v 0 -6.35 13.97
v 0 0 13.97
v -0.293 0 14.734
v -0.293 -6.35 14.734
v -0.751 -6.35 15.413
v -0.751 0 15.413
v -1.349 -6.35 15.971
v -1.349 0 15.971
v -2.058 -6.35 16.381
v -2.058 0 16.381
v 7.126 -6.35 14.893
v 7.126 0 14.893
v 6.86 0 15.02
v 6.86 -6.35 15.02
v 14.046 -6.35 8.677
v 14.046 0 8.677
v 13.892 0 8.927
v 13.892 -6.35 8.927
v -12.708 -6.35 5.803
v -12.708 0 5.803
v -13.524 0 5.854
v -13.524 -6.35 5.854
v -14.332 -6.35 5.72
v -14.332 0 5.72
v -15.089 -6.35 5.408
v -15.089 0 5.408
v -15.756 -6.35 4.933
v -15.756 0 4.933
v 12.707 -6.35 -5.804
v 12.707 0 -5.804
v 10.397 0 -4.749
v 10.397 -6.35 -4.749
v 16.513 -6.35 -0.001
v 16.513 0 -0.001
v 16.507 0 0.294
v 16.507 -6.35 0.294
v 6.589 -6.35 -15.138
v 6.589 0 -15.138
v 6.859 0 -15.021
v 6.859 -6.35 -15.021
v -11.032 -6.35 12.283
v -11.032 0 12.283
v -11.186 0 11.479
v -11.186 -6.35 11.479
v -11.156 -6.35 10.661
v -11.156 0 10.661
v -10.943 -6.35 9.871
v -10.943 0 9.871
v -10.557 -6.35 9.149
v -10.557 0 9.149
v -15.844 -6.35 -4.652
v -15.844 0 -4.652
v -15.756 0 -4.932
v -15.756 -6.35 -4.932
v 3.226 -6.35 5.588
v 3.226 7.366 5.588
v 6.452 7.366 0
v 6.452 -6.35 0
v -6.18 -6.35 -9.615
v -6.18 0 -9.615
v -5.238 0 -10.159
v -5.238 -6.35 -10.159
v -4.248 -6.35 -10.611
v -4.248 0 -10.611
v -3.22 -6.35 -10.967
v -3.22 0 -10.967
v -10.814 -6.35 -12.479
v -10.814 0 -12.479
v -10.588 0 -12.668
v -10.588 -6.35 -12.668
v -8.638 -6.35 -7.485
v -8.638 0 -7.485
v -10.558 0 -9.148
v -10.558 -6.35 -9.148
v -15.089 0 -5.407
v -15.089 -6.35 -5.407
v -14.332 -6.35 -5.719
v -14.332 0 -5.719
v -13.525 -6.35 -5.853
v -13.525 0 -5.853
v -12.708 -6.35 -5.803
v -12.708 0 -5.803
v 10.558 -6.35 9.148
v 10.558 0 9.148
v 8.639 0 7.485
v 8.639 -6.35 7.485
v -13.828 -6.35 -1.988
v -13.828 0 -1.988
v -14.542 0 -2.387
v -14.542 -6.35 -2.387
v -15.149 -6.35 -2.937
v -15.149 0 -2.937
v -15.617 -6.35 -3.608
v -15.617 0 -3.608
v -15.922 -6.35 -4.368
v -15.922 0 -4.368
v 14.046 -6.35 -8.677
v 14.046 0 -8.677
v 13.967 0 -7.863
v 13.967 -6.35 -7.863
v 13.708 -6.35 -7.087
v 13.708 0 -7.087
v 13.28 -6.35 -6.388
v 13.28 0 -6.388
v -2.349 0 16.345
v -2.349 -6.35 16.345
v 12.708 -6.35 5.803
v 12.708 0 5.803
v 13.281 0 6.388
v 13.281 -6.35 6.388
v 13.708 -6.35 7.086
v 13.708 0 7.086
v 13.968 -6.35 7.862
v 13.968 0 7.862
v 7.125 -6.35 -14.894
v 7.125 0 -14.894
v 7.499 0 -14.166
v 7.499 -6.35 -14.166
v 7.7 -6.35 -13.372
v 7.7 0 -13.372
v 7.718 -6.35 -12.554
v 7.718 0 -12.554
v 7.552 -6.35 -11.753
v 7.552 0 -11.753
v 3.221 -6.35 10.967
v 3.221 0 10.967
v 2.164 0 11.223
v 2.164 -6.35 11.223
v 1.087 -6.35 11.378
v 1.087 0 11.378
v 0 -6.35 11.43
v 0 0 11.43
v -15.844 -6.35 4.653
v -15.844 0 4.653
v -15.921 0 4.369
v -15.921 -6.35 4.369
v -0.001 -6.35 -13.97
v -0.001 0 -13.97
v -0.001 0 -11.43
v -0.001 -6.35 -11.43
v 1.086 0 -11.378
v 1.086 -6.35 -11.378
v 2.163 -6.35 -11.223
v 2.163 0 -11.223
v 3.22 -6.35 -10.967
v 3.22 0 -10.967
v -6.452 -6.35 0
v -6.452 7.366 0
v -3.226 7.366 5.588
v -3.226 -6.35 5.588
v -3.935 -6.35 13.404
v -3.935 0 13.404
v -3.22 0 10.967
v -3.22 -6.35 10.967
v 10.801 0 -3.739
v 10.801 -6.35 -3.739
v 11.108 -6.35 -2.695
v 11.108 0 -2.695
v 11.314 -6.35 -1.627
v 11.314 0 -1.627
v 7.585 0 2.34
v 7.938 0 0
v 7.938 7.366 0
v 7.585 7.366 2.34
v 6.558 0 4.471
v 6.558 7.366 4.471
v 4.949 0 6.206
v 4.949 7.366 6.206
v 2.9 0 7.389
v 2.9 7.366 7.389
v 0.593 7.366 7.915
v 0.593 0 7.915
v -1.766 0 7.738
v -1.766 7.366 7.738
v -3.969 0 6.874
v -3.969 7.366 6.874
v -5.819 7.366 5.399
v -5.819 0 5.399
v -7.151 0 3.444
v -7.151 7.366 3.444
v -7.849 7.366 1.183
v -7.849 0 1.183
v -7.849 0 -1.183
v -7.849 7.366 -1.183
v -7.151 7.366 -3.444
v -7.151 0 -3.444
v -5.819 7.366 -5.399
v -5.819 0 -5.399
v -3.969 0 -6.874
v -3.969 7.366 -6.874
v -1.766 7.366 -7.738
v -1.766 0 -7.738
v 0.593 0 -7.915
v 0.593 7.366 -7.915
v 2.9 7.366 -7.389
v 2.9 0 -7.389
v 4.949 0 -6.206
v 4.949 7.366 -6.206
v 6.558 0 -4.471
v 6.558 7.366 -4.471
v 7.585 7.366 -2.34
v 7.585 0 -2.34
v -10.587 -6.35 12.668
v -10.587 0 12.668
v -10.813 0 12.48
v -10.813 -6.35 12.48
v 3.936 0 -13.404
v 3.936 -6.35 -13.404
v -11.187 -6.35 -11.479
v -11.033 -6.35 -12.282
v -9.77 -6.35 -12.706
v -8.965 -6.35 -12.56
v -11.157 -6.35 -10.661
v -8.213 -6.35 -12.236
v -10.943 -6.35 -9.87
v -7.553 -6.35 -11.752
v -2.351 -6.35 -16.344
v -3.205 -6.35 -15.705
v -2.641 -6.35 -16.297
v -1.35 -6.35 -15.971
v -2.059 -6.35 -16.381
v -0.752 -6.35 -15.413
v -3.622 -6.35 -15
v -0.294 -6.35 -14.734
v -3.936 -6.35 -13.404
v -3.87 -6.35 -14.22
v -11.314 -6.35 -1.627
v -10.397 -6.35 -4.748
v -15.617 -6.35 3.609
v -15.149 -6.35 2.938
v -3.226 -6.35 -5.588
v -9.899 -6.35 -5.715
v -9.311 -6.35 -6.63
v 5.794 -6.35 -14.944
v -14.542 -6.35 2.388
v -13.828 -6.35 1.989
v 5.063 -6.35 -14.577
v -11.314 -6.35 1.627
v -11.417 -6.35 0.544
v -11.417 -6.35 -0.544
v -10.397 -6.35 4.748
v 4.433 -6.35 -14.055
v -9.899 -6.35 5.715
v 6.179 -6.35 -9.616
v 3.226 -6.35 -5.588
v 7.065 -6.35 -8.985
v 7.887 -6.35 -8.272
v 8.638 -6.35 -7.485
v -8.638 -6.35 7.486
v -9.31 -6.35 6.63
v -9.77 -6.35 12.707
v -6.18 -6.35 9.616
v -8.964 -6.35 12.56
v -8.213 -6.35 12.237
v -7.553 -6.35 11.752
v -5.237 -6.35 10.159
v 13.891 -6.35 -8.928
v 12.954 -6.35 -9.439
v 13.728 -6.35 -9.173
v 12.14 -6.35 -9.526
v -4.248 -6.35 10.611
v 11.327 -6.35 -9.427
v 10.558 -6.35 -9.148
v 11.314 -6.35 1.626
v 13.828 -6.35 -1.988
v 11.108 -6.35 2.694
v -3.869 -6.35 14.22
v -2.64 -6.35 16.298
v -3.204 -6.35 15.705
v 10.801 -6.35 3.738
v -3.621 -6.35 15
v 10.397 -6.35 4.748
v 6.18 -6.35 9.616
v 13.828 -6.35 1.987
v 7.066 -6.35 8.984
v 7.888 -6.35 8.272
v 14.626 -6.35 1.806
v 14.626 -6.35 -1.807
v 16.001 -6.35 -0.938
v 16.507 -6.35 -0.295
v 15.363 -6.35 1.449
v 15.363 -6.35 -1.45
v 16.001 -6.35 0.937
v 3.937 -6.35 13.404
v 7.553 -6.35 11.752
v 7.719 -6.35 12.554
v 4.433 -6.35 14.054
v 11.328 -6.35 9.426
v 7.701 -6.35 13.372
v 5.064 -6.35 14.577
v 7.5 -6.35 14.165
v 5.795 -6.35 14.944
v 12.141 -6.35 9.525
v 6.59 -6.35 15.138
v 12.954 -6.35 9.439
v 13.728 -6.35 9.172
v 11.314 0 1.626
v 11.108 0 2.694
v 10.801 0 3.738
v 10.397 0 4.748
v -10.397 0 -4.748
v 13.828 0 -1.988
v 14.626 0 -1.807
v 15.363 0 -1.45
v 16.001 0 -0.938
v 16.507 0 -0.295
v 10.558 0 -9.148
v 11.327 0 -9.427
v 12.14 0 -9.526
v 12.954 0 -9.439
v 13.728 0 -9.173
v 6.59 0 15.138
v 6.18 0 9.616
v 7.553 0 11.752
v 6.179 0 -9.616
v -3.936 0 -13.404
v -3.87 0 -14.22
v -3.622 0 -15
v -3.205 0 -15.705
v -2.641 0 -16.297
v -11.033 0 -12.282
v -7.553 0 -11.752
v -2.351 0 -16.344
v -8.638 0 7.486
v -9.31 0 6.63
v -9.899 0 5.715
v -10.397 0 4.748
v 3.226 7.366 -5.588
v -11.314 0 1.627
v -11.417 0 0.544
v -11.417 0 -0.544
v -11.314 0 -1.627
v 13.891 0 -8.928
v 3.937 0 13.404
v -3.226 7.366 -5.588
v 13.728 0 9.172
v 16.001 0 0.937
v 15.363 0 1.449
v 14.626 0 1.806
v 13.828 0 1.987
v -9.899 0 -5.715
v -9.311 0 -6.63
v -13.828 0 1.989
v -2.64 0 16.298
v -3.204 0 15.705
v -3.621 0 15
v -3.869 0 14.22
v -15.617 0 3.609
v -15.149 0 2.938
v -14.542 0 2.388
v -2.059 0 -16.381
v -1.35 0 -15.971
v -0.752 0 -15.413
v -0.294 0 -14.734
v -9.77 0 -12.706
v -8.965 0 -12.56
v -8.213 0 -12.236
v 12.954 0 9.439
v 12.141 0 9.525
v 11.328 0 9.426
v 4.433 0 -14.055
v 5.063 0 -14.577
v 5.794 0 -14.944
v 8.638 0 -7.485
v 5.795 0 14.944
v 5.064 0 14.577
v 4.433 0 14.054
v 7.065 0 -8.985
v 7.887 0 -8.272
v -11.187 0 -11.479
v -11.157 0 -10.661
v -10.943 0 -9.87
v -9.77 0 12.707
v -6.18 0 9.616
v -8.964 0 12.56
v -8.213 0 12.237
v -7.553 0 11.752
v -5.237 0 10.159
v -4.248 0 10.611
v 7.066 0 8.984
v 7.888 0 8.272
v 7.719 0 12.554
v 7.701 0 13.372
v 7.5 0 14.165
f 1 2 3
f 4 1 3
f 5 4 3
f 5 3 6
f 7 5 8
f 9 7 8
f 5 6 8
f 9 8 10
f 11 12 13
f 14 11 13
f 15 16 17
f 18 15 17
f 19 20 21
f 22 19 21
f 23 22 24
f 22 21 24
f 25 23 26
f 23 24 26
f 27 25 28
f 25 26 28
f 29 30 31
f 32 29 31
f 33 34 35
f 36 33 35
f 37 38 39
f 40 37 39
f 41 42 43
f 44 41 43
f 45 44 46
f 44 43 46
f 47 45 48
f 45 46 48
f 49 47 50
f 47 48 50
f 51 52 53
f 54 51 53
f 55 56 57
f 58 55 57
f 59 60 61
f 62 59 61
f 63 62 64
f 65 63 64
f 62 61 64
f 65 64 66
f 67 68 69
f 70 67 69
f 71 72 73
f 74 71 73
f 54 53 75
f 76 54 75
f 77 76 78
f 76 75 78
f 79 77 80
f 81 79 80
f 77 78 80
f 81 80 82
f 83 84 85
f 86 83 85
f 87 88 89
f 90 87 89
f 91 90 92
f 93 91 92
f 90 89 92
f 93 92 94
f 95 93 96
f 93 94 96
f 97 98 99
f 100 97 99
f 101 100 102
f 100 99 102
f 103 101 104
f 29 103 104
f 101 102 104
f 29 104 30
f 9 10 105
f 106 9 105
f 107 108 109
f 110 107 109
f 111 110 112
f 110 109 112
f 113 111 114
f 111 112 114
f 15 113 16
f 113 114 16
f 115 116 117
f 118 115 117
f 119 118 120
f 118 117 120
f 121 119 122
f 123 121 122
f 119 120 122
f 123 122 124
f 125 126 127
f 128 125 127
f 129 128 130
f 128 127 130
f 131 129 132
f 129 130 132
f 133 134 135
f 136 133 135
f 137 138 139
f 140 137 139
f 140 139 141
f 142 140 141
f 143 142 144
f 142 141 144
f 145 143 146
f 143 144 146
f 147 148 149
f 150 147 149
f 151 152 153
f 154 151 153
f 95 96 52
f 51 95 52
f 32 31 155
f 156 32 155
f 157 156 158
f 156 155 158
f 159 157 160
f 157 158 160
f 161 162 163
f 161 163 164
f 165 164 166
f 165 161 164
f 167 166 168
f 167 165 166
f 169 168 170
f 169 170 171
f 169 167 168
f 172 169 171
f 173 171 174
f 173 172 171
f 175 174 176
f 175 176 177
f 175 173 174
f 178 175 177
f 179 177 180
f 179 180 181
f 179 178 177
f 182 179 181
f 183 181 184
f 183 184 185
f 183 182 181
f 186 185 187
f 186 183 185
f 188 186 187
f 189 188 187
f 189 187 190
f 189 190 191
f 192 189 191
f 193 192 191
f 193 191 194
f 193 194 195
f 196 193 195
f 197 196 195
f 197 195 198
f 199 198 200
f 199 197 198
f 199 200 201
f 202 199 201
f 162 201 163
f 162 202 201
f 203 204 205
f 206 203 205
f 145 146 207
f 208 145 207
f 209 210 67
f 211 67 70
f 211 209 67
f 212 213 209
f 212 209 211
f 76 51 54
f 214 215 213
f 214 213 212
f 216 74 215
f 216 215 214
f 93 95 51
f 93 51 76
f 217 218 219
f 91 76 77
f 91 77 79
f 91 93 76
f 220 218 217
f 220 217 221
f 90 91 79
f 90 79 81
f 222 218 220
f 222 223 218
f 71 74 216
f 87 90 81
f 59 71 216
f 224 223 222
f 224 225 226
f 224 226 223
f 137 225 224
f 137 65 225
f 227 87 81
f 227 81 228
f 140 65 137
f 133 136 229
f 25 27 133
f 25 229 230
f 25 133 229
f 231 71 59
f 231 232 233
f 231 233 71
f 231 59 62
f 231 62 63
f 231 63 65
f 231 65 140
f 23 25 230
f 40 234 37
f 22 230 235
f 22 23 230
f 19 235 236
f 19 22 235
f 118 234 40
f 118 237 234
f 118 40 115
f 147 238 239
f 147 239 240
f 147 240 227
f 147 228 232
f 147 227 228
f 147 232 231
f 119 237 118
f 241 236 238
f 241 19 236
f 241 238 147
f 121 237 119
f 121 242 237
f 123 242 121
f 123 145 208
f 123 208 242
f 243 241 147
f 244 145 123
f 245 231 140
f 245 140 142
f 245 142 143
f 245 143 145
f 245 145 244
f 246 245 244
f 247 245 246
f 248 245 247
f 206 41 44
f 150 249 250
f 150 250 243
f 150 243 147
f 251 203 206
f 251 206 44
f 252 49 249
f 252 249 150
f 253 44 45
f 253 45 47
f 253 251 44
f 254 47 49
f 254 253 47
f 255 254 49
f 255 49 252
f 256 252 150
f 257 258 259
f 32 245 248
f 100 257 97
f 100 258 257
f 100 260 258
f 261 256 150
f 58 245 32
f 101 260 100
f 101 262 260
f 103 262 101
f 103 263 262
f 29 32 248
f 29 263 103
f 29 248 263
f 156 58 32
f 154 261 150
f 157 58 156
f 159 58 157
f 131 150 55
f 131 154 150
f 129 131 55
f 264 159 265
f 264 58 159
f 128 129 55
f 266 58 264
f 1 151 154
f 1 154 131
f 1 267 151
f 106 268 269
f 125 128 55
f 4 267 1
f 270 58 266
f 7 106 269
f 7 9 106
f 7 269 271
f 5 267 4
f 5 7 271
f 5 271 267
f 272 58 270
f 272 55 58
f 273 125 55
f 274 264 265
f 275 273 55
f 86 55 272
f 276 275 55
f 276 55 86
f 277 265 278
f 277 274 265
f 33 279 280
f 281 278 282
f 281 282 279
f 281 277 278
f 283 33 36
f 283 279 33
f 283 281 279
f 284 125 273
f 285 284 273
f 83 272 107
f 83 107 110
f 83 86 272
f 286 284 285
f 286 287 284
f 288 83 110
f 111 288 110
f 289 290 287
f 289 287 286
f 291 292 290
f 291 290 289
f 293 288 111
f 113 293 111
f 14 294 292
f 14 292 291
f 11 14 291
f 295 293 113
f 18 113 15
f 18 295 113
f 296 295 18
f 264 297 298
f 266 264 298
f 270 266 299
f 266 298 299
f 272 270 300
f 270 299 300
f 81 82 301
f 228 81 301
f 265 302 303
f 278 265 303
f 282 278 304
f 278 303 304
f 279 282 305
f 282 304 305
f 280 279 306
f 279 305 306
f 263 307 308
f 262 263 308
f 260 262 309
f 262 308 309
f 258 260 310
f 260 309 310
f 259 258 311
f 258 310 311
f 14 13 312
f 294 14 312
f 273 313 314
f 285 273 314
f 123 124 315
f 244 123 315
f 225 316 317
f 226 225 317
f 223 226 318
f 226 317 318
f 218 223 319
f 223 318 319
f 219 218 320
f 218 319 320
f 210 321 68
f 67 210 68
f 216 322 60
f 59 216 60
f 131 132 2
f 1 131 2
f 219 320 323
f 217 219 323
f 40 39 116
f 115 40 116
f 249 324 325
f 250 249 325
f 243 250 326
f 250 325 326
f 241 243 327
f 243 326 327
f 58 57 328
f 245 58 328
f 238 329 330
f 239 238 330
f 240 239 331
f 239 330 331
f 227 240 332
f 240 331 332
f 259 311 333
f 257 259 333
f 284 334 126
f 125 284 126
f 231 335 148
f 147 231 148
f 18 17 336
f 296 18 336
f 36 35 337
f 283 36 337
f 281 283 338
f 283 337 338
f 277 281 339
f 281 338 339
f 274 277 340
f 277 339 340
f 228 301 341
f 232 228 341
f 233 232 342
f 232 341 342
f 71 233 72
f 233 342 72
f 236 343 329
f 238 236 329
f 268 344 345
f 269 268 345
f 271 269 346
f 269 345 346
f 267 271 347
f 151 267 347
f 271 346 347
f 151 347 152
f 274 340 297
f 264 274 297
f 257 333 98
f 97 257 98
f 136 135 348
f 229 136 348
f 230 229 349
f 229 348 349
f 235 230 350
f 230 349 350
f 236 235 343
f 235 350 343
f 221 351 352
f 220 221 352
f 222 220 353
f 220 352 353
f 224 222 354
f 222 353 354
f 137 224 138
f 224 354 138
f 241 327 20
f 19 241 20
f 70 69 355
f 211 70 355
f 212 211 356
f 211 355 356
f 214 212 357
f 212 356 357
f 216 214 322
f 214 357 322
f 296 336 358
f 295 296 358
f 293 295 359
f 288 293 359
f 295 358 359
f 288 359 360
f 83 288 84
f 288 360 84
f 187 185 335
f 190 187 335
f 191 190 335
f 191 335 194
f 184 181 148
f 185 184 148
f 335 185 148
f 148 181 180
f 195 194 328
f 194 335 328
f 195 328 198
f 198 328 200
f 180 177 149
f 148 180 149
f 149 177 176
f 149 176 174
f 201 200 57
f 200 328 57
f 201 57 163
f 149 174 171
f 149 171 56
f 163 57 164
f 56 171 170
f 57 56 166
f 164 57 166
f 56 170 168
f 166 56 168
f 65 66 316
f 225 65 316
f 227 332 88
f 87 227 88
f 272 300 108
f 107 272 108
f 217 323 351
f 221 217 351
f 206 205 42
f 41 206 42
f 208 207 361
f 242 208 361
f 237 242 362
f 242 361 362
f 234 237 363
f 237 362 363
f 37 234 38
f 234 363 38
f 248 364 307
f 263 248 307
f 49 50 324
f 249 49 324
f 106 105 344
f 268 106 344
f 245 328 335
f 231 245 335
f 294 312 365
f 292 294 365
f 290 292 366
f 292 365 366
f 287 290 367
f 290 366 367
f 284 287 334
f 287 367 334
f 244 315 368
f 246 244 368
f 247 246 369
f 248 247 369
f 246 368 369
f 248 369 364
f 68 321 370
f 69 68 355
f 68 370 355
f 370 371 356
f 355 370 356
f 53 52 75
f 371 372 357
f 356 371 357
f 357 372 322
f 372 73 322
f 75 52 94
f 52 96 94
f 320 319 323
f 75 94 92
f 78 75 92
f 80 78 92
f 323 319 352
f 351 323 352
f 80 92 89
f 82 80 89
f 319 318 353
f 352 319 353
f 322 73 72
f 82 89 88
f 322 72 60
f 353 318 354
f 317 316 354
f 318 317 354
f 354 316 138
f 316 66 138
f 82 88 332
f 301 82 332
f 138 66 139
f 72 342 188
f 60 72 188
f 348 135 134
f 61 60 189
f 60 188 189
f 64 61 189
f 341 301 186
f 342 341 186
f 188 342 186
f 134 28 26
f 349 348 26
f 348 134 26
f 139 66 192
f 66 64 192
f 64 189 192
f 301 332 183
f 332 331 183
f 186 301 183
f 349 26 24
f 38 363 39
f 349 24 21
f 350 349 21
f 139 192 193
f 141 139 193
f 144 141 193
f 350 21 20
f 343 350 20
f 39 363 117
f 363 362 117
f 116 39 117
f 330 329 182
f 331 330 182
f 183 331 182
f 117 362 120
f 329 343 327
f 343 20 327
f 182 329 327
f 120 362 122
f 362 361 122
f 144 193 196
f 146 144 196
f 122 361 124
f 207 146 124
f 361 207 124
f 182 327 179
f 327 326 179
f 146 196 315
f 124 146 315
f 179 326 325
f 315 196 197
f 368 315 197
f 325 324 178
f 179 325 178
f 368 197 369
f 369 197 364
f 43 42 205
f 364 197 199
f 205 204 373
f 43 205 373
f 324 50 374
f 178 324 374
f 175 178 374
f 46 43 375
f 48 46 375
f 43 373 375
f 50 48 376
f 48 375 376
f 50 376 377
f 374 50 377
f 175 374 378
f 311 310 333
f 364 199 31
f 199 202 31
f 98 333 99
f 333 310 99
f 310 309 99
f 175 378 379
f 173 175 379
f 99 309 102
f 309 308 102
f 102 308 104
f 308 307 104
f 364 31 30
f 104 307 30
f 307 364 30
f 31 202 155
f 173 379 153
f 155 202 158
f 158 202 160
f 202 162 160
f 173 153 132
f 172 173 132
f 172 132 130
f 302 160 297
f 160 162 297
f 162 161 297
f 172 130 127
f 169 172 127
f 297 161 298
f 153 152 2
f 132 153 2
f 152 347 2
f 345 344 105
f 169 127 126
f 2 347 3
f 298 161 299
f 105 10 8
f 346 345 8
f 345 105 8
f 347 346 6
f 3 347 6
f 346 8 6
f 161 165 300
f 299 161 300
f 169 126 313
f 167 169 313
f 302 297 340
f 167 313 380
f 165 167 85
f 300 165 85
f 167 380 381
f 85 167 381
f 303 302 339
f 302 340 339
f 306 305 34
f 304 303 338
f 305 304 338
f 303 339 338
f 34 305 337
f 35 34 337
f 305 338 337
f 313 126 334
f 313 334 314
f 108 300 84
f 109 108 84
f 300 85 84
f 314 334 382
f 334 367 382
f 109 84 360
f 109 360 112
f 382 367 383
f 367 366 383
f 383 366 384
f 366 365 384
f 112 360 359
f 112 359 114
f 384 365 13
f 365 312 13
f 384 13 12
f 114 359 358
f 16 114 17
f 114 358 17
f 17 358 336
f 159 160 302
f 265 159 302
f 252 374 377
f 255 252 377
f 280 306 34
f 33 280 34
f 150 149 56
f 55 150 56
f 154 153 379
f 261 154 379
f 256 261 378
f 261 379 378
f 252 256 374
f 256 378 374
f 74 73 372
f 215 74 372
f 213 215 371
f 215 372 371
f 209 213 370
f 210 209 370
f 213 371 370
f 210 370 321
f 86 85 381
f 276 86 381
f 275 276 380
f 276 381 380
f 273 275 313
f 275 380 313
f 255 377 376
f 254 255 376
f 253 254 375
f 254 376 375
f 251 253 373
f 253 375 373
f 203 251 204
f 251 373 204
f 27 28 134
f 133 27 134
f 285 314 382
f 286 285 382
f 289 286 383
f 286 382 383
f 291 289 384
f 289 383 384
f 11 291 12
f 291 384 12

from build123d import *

# Parameters (mm, degrees)
F1_DEPTH = 6.35
F2_R     = 7.9375
F3_DEPTH = 7.366
F5_DEPTH = 25.4
F6_DEPTH = 25.4


with BuildPart() as f1:
    # F0 (on Front) → F1 (new body)
    with BuildSketch(Plane.XZ):
        with BuildLine():
            Line((-3.934953, 13.404367), (-3.219507, 10.967209))
            ThreePointArc((-3.219507, 10.967209), (-4.747864, 10.397244), (-6.179525, 9.615528))
            Line((-6.179525, 9.615528), (-7.552752, 11.752312))
            ThreePointArc((-7.552752, 11.752312), (-8.964411, 12.560176), (-10.587279, 12.66845))
            Line((-10.587279, 12.66845), (-10.813072, 12.47975))
            Line((-10.813072, 12.47975), (-11.031997, 12.283124))
            ThreePointArc((-11.031997, 12.283124), (-11.155886, 10.661374), (-10.557241, 9.149075))
            Line((-10.557241, 9.149075), (-8.637743, 7.485606))
            ThreePointArc((-8.637743, 7.485606), (-9.615332, 6.17983), (-10.397094, 4.748194))
            Line((-10.397094, 4.748194), (-12.707559, 5.803348))
            ThreePointArc((-12.707559, 5.803348), (-14.331886, 5.719766), (-15.755667, 4.933463))
            Line((-15.755667, 4.933463), (-15.843597, 4.652646))
            Line((-15.843597, 4.652646), (-15.921465, 4.368874))
            ThreePointArc((-15.921465, 4.368874), (-15.148902, 2.937591), (-13.827679, 1.989016))
            Line((-13.827679, 1.989016), (-11.313556, 1.627377))
            ThreePointArc((-11.313556, 1.627377), (-11.43, 0.000363), (-11.313659, -1.626659))
            Line((-11.313659, -1.626659), (-13.827806, -1.988138))
            ThreePointArc((-13.827806, -1.988138), (-15.149089, -2.936629), (-15.921742, -4.367864))
            Line((-15.921742, -4.367864), (-15.843893, -4.65164))
            Line((-15.843893, -4.65164), (-15.75598, -4.932463))
            ThreePointArc((-15.75598, -4.932463), (-14.332249, -5.718857), (-12.707927, -5.802541))
            Line((-12.707927, -5.802541), (-10.397395, -4.747534))
            ThreePointArc((-10.397395, -4.747534), (-9.615724, -6.179219), (-8.638218, -7.485058))
            Line((-8.638218, -7.485058), (-10.557822, -9.148404))
            ThreePointArc((-10.557822, -9.148404), (-11.156563, -10.660665), (-11.032776, -12.282424))
            Line((-11.032776, -12.282424), (-10.813864, -12.479064))
            Line((-10.813864, -12.479064), (-10.588083, -12.667778))
            ThreePointArc((-10.588083, -12.667778), (-8.965208, -12.559607), (-7.553498, -11.751832))
            Line((-7.553498, -11.751832), (-6.180135, -9.615136))
            ThreePointArc((-6.180135, -9.615136), (-4.748524, -10.396943), (-3.220203, -10.967005))
            Line((-3.220203, -10.967005), (-3.935804, -13.404117))
            ThreePointArc((-3.935804, -13.404117), (-3.621907, -15.000016), (-2.640982, -16.297402))
            Line((-2.640982, -16.297402), (-2.35051, -16.344473))
            Line((-2.35051, -16.344473), (-2.058545, -16.381163))
            ThreePointArc((-2.058545, -16.381163), (-0.751777, -15.412771), (-0.000887, -13.97))
            Line((-0.000887, -13.97), (-0.000725, -11.43))
            ThreePointArc((-0.000725, -11.43), (1.6263, -11.313711), (3.220203, -10.967005))
            Line((3.220203, -10.967005), (3.935804, -13.404117))
            ThreePointArc((3.935804, -13.404117), (5.062679, -14.576967), (6.589305, -15.13807))
            Line((6.589305, -15.13807), (6.859114, -15.020627))
            Line((6.859114, -15.020627), (7.124567, -14.893644))
            ThreePointArc((7.124567, -14.893644), (7.700339, -13.372489), (7.552006, -11.752791))
            Line((7.552006, -11.752791), (6.178914, -9.61592))
            ThreePointArc((6.178914, -9.61592), (7.484784, -8.638455), (8.638218, -7.485058))
            Line((8.638218, -7.485058), (10.557822, -9.148404))
            ThreePointArc((10.557822, -9.148404), (12.1399, -9.525834), (13.727535, -9.172507))
            Line((13.727535, -9.172507), (13.891018, -8.927838))
            Line((13.891018, -8.927838), (14.045679, -8.677499))
            ThreePointArc((14.045679, -8.677499), (13.707651, -7.086537), (12.707191, -5.804154))
            Line((12.707191, -5.804154), (10.396792, -4.748853))
            ThreePointArc((10.396792, -4.748853), (10.966902, -3.220551), (11.313659, -1.626659))
            Line((11.313659, -1.626659), (13.827806, -1.988138))
            ThreePointArc((13.827806, -1.988138), (15.362788, -1.450316), (16.507369, -0.294739))
            Line((16.507369, -0.294739), (16.512622, -0.000524))
            Line((16.512622, -0.000524), (16.507388, 0.293691))
            ThreePointArc((16.507388, 0.293691), (15.36288, 1.449341), (13.827932, 1.987261))
            Line((13.827932, 1.987261), (11.313762, 1.625941))
            ThreePointArc((11.313762, 1.625941), (10.967107, 3.219855), (10.397094, 4.748194))
            Line((10.397094, 4.748194), (12.707559, 5.803348))
            ThreePointArc((12.707559, 5.803348), (13.7081, 7.085667), (14.04623, 8.676607))
            Line((14.04623, 8.676607), (13.891585, 8.926957))
            Line((13.891585, 8.926957), (13.728117, 9.171636))
            ThreePointArc((13.728117, 9.171636), (12.140504, 9.525064), (10.558402, 9.147734))
            Line((10.558402, 9.147734), (8.638693, 7.48451))
            ThreePointArc((8.638693, 7.48451), (7.485332, 8.63798), (6.179525, 9.615528))
            Line((6.179525, 9.615528), (7.552752, 11.752312))
            ThreePointArc((7.552752, 11.752312), (7.701187, 13.372001), (7.125513, 14.893192))
            Line((7.125513, 14.893192), (6.860068, 15.020192))
            Line((6.860068, 15.020192), (6.590266, 15.137652))
            ThreePointArc((6.590266, 15.137652), (5.063604, 14.576646), (3.936655, 13.403867))
            Line((3.936655, 13.403867), (3.220899, 10.9668))
            ThreePointArc((3.220899, 10.9668), (1.627018, 11.313607), (0, 11.43))
            Line((0, 11.43), (0, 13.97))
            ThreePointArc((0, 13.97), (-0.750798, 15.412819), (-2.057505, 16.381293))
            Line((-2.057505, 16.381293), (-2.349472, 16.344622))
            Line((-2.349472, 16.344622), (-2.639948, 16.29757))
            ThreePointArc((-2.639948, 16.29757), (-3.620955, 15.000246), (-3.934953, 13.404367))
        make_face()
    extrude(amount=F1_DEPTH)

    # F2 (on Front) → F3 (join)
    with BuildSketch(Plane.XZ):
        Circle(F2_R)
    extrude(amount=-F3_DEPTH)

    # F4 (on Front) → F5 (cut)
    with BuildSketch(Plane.XZ):
        Polygon((3.226233, -5.588), (6.452467, 0), (3.226233, 5.588), (-3.226233, 5.588), (-6.452467, 0), (-3.226233, -5.588), align=None)
    extrude(amount=-F5_DEPTH, mode=Mode.SUBTRACT)

    # F5_face (on face) → F6 (cut)
    with BuildSketch(Plane(origin=(0, 0, 0), x_dir=(1, 0, 0), z_dir=(0, 1, 0))):
        Polygon((6.452467, 0), (3.226233, 5.588), (-3.226233, 5.588), (-6.452467, 0), (-3.226233, -5.588), (3.226233, -5.588), align=None)
    extrude(amount=-F6_DEPTH, mode=Mode.SUBTRACT)


solid = f1.part
